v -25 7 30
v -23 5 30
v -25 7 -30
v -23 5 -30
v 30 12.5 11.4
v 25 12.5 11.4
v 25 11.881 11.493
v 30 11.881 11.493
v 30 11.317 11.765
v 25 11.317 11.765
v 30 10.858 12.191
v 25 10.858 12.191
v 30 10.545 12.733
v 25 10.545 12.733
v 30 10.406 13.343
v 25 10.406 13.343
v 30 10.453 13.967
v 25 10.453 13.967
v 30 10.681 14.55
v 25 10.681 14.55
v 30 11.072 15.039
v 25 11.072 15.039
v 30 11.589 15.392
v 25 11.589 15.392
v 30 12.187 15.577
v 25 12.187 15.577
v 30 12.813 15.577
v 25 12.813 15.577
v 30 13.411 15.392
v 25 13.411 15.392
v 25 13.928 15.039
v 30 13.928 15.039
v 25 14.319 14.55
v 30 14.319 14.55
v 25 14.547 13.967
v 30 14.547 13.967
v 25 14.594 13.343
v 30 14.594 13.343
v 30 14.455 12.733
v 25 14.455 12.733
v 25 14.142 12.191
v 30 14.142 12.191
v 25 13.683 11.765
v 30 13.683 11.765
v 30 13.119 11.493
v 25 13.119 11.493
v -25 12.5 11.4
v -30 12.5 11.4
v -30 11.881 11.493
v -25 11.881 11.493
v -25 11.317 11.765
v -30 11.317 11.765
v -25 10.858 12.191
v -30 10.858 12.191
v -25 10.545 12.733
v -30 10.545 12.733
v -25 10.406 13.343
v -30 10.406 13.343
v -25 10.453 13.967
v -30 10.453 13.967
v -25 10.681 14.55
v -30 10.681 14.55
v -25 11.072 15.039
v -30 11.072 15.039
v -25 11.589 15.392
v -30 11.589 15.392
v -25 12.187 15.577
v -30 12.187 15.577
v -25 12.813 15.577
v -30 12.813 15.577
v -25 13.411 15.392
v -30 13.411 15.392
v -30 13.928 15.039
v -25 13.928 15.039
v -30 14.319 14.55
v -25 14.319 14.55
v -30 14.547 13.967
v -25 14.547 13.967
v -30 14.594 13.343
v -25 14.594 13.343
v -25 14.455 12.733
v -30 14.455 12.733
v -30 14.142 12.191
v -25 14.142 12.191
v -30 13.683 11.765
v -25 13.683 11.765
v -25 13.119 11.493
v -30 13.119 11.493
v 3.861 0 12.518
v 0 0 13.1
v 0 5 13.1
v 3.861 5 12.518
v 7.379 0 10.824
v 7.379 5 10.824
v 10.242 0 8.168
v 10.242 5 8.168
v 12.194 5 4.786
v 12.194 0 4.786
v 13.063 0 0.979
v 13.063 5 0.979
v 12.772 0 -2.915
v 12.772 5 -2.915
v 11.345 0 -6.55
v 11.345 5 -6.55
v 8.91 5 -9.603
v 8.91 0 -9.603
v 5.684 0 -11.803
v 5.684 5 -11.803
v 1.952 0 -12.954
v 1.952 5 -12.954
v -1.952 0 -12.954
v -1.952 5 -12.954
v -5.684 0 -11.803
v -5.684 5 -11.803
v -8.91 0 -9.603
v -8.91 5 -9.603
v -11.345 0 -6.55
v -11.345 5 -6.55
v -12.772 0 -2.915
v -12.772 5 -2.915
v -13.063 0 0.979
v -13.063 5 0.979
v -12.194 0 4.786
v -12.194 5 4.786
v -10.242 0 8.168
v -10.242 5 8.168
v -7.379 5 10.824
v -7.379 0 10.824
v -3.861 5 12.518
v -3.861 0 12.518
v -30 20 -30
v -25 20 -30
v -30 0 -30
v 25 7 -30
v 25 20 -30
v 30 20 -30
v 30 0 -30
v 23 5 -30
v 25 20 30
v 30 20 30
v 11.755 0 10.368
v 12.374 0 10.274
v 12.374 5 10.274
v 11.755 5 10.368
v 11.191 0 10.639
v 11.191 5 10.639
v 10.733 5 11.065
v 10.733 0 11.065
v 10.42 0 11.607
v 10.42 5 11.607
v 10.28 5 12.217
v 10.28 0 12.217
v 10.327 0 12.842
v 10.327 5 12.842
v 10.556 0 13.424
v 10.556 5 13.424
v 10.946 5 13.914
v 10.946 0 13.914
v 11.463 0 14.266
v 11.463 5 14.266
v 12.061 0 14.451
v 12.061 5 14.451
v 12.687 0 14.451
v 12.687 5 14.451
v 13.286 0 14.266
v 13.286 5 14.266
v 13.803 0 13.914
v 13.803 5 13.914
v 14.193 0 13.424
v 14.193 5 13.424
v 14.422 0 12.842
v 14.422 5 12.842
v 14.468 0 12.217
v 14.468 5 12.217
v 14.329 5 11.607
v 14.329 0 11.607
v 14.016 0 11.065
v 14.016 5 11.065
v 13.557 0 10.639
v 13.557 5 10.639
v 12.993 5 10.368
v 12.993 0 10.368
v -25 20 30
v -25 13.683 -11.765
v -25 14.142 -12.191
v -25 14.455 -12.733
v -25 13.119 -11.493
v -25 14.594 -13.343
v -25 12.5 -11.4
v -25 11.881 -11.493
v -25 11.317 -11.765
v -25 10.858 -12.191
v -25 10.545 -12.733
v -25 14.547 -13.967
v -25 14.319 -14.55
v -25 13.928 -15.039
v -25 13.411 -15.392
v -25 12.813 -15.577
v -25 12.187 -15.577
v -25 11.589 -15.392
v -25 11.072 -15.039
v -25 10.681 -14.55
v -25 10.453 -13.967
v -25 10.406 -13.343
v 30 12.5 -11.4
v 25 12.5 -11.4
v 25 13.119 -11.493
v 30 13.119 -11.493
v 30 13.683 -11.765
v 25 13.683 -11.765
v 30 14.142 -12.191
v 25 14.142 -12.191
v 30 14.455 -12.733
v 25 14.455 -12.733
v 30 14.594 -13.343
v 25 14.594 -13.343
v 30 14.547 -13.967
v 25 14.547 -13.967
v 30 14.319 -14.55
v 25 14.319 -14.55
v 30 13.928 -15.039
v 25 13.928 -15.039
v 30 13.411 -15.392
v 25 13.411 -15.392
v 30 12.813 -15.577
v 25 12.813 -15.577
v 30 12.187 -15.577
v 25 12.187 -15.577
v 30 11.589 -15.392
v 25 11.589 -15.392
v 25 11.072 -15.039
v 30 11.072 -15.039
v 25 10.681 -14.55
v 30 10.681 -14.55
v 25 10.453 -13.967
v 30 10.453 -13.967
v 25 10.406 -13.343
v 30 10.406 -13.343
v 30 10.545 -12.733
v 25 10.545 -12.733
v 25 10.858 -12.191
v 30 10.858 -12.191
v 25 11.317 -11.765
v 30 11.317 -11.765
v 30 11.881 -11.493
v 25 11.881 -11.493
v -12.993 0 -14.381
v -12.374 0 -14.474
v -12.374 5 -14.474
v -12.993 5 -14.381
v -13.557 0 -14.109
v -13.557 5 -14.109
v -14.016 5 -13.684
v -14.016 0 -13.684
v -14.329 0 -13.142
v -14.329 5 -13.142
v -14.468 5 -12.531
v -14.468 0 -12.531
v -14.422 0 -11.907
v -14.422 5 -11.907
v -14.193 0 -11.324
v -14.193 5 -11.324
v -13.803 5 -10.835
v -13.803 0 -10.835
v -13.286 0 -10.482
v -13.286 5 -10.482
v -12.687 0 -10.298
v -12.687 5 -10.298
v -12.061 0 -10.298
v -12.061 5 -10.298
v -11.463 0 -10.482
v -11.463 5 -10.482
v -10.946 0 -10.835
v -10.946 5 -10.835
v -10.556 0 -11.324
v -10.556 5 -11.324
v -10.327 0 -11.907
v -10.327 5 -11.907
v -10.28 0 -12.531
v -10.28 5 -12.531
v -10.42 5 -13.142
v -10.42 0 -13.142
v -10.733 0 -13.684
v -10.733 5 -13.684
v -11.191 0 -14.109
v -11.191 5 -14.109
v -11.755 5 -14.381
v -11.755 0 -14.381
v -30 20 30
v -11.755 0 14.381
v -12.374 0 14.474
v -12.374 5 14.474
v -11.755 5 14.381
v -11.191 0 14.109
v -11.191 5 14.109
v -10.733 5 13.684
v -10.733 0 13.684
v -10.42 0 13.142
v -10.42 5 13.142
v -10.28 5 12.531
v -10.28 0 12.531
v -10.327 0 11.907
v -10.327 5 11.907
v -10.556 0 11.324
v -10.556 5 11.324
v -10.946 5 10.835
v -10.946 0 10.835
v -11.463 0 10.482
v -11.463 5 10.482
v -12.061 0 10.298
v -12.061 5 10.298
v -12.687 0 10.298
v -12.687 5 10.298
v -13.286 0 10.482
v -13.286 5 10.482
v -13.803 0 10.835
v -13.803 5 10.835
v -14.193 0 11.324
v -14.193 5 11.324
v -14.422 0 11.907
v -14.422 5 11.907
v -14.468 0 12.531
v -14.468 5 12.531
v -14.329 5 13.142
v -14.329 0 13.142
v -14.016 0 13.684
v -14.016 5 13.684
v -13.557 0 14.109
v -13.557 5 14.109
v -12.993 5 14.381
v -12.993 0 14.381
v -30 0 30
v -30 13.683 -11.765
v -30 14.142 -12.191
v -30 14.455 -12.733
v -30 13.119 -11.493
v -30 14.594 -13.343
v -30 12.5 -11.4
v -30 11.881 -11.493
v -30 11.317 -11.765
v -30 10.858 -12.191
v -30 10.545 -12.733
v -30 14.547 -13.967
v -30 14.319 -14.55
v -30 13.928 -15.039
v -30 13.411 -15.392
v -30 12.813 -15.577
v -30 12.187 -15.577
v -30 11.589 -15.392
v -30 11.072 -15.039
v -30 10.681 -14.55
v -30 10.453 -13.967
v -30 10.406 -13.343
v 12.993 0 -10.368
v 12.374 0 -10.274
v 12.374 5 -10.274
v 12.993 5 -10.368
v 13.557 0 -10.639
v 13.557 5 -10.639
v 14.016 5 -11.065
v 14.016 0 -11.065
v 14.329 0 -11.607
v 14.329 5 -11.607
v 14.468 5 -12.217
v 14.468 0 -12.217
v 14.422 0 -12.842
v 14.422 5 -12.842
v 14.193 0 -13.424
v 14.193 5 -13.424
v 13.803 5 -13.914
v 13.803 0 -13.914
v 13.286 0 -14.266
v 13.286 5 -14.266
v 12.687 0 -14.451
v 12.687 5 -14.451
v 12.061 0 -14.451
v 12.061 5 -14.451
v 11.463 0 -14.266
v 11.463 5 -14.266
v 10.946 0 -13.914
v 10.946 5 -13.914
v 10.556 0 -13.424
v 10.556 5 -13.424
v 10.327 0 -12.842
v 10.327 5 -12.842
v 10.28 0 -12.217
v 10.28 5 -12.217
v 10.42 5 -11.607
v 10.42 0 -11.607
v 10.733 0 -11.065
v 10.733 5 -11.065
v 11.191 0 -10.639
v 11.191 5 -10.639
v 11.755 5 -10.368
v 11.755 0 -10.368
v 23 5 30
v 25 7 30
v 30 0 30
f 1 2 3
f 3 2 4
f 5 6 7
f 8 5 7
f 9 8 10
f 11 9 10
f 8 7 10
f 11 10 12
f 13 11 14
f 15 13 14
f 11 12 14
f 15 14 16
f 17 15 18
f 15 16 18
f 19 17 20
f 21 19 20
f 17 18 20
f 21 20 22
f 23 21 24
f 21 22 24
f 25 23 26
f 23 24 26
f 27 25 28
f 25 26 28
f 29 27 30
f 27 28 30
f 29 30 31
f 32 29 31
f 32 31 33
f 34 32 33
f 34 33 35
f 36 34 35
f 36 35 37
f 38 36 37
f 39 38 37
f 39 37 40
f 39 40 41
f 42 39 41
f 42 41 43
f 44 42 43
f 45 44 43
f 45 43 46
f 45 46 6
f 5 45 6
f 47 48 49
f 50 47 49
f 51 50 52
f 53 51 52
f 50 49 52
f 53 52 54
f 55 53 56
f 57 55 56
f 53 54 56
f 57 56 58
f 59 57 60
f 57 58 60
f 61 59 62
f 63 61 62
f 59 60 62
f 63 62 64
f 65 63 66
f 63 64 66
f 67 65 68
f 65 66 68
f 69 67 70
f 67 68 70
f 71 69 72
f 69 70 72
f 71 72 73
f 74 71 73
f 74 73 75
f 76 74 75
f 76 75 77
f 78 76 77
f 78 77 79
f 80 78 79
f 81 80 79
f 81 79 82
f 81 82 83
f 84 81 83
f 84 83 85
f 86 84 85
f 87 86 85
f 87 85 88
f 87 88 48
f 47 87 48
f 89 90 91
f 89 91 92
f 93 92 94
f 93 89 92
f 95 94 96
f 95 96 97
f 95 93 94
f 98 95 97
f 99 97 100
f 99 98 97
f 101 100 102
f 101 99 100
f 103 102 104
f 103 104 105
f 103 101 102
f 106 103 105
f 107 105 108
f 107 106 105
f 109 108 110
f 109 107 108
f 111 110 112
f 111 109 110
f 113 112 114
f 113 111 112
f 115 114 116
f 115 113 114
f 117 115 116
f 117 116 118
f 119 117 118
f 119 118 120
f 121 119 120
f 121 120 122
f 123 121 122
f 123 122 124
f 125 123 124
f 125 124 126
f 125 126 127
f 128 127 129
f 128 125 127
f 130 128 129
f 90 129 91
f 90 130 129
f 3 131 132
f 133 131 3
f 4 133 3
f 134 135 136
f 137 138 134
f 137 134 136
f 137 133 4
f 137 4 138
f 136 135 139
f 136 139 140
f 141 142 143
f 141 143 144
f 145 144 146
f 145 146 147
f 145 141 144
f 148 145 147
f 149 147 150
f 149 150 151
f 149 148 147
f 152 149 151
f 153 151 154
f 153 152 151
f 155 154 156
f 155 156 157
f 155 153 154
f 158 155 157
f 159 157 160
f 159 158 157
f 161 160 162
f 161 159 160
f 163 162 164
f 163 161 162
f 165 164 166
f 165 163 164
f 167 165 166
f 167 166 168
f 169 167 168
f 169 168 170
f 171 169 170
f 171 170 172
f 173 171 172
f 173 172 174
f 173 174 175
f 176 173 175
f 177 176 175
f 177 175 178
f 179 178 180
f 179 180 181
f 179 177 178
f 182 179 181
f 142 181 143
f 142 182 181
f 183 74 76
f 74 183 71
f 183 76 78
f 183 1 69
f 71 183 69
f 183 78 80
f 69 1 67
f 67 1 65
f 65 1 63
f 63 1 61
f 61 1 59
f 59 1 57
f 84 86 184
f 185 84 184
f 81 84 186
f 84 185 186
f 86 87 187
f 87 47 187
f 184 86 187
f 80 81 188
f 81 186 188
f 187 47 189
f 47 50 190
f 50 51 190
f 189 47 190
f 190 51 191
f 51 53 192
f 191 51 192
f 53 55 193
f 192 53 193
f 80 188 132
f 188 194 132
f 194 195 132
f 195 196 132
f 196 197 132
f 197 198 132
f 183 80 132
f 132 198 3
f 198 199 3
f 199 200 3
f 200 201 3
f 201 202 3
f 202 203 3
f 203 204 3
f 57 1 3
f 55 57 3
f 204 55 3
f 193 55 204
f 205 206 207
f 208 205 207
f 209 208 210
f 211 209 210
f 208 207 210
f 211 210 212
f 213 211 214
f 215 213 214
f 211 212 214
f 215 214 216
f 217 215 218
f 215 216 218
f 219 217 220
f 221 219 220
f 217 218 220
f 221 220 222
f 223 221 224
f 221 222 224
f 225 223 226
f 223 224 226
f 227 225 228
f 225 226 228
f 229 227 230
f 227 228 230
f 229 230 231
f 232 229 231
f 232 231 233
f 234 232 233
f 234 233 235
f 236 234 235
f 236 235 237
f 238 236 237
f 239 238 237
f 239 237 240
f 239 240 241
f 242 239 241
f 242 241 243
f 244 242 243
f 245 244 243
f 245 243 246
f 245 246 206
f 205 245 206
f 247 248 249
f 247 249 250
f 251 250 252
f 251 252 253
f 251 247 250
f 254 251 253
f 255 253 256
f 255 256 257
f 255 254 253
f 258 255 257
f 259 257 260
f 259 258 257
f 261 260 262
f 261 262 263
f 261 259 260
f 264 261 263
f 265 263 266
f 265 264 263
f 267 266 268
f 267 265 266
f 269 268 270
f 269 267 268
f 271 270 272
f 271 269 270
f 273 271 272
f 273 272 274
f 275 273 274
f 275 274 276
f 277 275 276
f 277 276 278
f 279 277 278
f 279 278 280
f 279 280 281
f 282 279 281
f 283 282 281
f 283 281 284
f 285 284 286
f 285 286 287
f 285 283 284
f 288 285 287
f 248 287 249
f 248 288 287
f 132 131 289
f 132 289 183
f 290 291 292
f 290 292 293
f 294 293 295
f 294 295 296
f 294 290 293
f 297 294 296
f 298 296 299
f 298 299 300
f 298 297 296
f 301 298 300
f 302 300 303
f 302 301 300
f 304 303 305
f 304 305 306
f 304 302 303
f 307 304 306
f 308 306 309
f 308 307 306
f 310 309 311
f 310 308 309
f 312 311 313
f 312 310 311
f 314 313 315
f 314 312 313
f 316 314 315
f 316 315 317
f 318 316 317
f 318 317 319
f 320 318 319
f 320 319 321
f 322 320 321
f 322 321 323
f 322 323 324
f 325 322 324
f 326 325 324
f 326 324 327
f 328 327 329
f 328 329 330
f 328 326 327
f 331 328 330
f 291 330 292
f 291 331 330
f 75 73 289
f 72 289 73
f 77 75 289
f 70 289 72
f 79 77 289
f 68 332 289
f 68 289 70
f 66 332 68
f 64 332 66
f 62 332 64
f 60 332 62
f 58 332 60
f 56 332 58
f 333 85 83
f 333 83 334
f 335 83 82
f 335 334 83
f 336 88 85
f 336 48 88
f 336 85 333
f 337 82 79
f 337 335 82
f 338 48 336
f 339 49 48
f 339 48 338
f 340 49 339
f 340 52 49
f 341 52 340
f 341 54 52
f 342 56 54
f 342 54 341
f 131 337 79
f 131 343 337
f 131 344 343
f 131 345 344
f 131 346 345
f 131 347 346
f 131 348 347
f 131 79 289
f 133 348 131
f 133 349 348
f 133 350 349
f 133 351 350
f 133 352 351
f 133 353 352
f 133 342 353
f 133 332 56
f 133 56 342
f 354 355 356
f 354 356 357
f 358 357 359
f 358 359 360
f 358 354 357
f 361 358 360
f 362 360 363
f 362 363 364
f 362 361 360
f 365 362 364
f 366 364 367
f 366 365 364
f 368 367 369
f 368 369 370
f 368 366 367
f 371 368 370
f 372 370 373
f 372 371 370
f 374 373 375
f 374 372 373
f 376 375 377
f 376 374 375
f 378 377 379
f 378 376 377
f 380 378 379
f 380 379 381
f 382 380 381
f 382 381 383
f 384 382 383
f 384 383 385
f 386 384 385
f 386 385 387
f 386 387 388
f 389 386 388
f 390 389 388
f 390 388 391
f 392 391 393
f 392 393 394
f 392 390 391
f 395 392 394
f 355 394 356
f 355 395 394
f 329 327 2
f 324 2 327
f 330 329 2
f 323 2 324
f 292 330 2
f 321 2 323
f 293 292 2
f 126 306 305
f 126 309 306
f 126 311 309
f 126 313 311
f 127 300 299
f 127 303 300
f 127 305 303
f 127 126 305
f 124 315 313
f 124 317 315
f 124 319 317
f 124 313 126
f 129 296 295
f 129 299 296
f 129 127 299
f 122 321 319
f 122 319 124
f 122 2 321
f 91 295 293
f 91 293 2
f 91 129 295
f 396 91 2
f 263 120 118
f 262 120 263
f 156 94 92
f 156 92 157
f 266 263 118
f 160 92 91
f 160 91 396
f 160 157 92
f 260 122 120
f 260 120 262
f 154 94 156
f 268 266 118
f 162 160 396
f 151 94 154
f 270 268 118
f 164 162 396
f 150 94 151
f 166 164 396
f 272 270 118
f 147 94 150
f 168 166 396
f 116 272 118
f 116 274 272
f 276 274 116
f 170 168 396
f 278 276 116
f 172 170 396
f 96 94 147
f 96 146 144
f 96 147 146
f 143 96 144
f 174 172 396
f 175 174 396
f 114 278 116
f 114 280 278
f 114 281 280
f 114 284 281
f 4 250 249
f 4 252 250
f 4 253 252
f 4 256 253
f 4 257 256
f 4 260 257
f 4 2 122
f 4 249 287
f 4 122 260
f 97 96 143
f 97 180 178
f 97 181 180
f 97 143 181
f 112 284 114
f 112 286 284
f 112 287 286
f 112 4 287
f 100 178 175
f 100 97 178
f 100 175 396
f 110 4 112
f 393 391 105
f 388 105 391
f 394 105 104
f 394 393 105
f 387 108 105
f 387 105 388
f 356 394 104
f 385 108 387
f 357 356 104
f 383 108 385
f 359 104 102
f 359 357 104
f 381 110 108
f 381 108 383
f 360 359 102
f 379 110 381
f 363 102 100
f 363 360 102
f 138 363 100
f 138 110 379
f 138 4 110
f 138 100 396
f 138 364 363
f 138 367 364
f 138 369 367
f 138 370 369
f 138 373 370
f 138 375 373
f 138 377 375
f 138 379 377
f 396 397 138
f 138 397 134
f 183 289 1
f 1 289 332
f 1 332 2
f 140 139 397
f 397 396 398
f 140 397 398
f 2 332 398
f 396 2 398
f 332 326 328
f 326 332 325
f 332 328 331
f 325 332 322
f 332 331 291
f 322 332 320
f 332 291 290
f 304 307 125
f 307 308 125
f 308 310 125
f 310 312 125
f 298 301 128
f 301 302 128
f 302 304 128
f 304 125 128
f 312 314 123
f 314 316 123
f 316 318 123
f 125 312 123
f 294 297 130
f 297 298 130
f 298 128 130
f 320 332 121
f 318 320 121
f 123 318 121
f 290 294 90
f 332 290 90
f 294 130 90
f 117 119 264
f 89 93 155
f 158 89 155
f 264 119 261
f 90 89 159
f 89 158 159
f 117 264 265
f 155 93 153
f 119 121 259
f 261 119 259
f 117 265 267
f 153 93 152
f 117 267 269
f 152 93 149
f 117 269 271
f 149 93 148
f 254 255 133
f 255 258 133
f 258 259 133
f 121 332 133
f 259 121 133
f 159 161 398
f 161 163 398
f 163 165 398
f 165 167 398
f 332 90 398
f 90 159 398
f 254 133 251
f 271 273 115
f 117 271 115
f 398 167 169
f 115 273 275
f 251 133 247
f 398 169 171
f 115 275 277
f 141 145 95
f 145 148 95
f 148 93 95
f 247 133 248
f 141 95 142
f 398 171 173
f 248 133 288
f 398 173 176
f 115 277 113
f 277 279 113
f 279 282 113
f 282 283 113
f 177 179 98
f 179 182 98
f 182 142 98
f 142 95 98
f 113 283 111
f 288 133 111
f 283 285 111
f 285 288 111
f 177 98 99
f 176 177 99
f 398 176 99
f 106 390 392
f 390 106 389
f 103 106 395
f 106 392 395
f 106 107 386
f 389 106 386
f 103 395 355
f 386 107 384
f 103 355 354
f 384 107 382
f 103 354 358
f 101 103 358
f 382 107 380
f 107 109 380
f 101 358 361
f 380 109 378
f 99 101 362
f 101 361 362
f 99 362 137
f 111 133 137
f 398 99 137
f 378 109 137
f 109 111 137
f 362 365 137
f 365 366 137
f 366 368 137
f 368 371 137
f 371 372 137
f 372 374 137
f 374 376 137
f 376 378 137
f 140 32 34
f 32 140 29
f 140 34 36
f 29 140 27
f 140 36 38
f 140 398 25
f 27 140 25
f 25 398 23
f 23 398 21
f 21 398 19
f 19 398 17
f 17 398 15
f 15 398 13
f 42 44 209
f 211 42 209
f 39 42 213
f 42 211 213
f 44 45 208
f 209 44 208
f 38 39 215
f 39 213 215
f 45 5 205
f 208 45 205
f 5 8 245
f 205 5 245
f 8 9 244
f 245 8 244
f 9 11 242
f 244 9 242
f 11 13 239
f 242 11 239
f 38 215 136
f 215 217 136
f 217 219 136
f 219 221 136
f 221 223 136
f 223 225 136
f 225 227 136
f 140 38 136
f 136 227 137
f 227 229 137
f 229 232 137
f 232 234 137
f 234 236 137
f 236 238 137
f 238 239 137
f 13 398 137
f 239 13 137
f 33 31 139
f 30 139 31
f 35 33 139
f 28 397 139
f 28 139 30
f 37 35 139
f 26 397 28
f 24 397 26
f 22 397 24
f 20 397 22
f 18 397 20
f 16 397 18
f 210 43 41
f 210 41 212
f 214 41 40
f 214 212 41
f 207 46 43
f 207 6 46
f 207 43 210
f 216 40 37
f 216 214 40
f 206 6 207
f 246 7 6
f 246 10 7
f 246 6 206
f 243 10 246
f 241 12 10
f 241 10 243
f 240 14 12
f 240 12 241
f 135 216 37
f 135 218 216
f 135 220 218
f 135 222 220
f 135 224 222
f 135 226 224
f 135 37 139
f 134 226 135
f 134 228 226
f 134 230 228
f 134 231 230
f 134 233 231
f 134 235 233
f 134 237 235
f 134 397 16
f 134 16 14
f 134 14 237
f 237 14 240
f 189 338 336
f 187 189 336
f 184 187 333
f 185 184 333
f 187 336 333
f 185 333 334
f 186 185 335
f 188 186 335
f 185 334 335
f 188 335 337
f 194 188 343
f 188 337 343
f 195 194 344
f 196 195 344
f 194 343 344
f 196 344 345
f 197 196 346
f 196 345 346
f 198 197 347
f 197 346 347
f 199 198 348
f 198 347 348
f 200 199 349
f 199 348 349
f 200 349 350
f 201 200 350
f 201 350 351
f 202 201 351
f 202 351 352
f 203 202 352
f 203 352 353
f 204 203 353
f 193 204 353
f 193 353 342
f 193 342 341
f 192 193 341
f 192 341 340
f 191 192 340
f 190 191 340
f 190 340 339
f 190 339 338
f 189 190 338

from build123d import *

# Parameters (mm, degrees)
SKETCH_1_W           = 60
SKETCH_1_H           = 60
SKETCH_1_R           = 13.1
SKETCH_1_R_2         = 2.1
EXTRUDE_1_DEPTH      = 5
SKETCH_2_W           = 5
SKETCH_2_H           = 60
EXTRUDE_2_DEPTH      = 15
SKETCH_4_R           = 2.1
CUT_EXTRUDE_M4_DEPTH = 71
CHAMFER_1_SIZE       = 2


with BuildPart() as part:
    # 草图1 → 凸台-拉伸1 (new body)
    with BuildSketch(Plane(origin=(0, 0, 0), x_dir=(1, 0, 0), z_dir=(0, 1, 0))):
        Rectangle(SKETCH_1_W, SKETCH_1_H)
        with Locations(Location((0, 0, 0), (0, 0, 270))):
            Circle(SKETCH_1_R, mode=Mode.SUBTRACT)
        with Locations(Location((-12.374368671, -12.374368671, 0), (0, 0, 270))):
            Circle(SKETCH_1_R_2, mode=Mode.SUBTRACT)
        with Locations(Location((12.374368671, -12.374368671, 0), (0, 0, 90))):
            Circle(SKETCH_1_R_2, mode=Mode.SUBTRACT)
        with Locations(Location((-12.374368671, 12.374368671, 0), (0, 0, 90))):
            Circle(SKETCH_1_R_2, mode=Mode.SUBTRACT)
        with Locations(Location((12.374368671, 12.374368671, 0), (0, 0, 270))):
            Circle(SKETCH_1_R_2, mode=Mode.SUBTRACT)
    extrude(amount=EXTRUDE_1_DEPTH)

    # 草图2 → 凸台-拉伸2 (add)
    with BuildSketch(Plane(origin=(0, 5, 0), x_dir=(1, 0, 0), z_dir=(0, 1, 0))):
        with Locations((-27.5, 0)):
            Rectangle(SKETCH_2_W, SKETCH_2_H)
        with Locations((27.5, 0)):
            Rectangle(SKETCH_2_W, SKETCH_2_H)
    extrude(amount=EXTRUDE_2_DEPTH)

    # 草图4 → M4通孔 (cut, through all)
    with BuildSketch(Plane.ZY.offset(30)):
        with Locations((-13.5, 12.5)):
            Circle(SKETCH_4_R)
        with Locations(Location((13.5, 12.5, 0), (0, 0, 180))):
            Circle(SKETCH_4_R)
    extrude(amount=-CUT_EXTRUDE_M4_DEPTH, mode=Mode.SUBTRACT)

    # 倒角1
    chamfer_1_edges = [part.edges().sort_by_distance(p)[0] for p in [
        (-25, 5, 0),
        (25, 5, 0),
    ]]
    chamfer(chamfer_1_edges, length=CHAMFER_1_SIZE)


solid = part.part
